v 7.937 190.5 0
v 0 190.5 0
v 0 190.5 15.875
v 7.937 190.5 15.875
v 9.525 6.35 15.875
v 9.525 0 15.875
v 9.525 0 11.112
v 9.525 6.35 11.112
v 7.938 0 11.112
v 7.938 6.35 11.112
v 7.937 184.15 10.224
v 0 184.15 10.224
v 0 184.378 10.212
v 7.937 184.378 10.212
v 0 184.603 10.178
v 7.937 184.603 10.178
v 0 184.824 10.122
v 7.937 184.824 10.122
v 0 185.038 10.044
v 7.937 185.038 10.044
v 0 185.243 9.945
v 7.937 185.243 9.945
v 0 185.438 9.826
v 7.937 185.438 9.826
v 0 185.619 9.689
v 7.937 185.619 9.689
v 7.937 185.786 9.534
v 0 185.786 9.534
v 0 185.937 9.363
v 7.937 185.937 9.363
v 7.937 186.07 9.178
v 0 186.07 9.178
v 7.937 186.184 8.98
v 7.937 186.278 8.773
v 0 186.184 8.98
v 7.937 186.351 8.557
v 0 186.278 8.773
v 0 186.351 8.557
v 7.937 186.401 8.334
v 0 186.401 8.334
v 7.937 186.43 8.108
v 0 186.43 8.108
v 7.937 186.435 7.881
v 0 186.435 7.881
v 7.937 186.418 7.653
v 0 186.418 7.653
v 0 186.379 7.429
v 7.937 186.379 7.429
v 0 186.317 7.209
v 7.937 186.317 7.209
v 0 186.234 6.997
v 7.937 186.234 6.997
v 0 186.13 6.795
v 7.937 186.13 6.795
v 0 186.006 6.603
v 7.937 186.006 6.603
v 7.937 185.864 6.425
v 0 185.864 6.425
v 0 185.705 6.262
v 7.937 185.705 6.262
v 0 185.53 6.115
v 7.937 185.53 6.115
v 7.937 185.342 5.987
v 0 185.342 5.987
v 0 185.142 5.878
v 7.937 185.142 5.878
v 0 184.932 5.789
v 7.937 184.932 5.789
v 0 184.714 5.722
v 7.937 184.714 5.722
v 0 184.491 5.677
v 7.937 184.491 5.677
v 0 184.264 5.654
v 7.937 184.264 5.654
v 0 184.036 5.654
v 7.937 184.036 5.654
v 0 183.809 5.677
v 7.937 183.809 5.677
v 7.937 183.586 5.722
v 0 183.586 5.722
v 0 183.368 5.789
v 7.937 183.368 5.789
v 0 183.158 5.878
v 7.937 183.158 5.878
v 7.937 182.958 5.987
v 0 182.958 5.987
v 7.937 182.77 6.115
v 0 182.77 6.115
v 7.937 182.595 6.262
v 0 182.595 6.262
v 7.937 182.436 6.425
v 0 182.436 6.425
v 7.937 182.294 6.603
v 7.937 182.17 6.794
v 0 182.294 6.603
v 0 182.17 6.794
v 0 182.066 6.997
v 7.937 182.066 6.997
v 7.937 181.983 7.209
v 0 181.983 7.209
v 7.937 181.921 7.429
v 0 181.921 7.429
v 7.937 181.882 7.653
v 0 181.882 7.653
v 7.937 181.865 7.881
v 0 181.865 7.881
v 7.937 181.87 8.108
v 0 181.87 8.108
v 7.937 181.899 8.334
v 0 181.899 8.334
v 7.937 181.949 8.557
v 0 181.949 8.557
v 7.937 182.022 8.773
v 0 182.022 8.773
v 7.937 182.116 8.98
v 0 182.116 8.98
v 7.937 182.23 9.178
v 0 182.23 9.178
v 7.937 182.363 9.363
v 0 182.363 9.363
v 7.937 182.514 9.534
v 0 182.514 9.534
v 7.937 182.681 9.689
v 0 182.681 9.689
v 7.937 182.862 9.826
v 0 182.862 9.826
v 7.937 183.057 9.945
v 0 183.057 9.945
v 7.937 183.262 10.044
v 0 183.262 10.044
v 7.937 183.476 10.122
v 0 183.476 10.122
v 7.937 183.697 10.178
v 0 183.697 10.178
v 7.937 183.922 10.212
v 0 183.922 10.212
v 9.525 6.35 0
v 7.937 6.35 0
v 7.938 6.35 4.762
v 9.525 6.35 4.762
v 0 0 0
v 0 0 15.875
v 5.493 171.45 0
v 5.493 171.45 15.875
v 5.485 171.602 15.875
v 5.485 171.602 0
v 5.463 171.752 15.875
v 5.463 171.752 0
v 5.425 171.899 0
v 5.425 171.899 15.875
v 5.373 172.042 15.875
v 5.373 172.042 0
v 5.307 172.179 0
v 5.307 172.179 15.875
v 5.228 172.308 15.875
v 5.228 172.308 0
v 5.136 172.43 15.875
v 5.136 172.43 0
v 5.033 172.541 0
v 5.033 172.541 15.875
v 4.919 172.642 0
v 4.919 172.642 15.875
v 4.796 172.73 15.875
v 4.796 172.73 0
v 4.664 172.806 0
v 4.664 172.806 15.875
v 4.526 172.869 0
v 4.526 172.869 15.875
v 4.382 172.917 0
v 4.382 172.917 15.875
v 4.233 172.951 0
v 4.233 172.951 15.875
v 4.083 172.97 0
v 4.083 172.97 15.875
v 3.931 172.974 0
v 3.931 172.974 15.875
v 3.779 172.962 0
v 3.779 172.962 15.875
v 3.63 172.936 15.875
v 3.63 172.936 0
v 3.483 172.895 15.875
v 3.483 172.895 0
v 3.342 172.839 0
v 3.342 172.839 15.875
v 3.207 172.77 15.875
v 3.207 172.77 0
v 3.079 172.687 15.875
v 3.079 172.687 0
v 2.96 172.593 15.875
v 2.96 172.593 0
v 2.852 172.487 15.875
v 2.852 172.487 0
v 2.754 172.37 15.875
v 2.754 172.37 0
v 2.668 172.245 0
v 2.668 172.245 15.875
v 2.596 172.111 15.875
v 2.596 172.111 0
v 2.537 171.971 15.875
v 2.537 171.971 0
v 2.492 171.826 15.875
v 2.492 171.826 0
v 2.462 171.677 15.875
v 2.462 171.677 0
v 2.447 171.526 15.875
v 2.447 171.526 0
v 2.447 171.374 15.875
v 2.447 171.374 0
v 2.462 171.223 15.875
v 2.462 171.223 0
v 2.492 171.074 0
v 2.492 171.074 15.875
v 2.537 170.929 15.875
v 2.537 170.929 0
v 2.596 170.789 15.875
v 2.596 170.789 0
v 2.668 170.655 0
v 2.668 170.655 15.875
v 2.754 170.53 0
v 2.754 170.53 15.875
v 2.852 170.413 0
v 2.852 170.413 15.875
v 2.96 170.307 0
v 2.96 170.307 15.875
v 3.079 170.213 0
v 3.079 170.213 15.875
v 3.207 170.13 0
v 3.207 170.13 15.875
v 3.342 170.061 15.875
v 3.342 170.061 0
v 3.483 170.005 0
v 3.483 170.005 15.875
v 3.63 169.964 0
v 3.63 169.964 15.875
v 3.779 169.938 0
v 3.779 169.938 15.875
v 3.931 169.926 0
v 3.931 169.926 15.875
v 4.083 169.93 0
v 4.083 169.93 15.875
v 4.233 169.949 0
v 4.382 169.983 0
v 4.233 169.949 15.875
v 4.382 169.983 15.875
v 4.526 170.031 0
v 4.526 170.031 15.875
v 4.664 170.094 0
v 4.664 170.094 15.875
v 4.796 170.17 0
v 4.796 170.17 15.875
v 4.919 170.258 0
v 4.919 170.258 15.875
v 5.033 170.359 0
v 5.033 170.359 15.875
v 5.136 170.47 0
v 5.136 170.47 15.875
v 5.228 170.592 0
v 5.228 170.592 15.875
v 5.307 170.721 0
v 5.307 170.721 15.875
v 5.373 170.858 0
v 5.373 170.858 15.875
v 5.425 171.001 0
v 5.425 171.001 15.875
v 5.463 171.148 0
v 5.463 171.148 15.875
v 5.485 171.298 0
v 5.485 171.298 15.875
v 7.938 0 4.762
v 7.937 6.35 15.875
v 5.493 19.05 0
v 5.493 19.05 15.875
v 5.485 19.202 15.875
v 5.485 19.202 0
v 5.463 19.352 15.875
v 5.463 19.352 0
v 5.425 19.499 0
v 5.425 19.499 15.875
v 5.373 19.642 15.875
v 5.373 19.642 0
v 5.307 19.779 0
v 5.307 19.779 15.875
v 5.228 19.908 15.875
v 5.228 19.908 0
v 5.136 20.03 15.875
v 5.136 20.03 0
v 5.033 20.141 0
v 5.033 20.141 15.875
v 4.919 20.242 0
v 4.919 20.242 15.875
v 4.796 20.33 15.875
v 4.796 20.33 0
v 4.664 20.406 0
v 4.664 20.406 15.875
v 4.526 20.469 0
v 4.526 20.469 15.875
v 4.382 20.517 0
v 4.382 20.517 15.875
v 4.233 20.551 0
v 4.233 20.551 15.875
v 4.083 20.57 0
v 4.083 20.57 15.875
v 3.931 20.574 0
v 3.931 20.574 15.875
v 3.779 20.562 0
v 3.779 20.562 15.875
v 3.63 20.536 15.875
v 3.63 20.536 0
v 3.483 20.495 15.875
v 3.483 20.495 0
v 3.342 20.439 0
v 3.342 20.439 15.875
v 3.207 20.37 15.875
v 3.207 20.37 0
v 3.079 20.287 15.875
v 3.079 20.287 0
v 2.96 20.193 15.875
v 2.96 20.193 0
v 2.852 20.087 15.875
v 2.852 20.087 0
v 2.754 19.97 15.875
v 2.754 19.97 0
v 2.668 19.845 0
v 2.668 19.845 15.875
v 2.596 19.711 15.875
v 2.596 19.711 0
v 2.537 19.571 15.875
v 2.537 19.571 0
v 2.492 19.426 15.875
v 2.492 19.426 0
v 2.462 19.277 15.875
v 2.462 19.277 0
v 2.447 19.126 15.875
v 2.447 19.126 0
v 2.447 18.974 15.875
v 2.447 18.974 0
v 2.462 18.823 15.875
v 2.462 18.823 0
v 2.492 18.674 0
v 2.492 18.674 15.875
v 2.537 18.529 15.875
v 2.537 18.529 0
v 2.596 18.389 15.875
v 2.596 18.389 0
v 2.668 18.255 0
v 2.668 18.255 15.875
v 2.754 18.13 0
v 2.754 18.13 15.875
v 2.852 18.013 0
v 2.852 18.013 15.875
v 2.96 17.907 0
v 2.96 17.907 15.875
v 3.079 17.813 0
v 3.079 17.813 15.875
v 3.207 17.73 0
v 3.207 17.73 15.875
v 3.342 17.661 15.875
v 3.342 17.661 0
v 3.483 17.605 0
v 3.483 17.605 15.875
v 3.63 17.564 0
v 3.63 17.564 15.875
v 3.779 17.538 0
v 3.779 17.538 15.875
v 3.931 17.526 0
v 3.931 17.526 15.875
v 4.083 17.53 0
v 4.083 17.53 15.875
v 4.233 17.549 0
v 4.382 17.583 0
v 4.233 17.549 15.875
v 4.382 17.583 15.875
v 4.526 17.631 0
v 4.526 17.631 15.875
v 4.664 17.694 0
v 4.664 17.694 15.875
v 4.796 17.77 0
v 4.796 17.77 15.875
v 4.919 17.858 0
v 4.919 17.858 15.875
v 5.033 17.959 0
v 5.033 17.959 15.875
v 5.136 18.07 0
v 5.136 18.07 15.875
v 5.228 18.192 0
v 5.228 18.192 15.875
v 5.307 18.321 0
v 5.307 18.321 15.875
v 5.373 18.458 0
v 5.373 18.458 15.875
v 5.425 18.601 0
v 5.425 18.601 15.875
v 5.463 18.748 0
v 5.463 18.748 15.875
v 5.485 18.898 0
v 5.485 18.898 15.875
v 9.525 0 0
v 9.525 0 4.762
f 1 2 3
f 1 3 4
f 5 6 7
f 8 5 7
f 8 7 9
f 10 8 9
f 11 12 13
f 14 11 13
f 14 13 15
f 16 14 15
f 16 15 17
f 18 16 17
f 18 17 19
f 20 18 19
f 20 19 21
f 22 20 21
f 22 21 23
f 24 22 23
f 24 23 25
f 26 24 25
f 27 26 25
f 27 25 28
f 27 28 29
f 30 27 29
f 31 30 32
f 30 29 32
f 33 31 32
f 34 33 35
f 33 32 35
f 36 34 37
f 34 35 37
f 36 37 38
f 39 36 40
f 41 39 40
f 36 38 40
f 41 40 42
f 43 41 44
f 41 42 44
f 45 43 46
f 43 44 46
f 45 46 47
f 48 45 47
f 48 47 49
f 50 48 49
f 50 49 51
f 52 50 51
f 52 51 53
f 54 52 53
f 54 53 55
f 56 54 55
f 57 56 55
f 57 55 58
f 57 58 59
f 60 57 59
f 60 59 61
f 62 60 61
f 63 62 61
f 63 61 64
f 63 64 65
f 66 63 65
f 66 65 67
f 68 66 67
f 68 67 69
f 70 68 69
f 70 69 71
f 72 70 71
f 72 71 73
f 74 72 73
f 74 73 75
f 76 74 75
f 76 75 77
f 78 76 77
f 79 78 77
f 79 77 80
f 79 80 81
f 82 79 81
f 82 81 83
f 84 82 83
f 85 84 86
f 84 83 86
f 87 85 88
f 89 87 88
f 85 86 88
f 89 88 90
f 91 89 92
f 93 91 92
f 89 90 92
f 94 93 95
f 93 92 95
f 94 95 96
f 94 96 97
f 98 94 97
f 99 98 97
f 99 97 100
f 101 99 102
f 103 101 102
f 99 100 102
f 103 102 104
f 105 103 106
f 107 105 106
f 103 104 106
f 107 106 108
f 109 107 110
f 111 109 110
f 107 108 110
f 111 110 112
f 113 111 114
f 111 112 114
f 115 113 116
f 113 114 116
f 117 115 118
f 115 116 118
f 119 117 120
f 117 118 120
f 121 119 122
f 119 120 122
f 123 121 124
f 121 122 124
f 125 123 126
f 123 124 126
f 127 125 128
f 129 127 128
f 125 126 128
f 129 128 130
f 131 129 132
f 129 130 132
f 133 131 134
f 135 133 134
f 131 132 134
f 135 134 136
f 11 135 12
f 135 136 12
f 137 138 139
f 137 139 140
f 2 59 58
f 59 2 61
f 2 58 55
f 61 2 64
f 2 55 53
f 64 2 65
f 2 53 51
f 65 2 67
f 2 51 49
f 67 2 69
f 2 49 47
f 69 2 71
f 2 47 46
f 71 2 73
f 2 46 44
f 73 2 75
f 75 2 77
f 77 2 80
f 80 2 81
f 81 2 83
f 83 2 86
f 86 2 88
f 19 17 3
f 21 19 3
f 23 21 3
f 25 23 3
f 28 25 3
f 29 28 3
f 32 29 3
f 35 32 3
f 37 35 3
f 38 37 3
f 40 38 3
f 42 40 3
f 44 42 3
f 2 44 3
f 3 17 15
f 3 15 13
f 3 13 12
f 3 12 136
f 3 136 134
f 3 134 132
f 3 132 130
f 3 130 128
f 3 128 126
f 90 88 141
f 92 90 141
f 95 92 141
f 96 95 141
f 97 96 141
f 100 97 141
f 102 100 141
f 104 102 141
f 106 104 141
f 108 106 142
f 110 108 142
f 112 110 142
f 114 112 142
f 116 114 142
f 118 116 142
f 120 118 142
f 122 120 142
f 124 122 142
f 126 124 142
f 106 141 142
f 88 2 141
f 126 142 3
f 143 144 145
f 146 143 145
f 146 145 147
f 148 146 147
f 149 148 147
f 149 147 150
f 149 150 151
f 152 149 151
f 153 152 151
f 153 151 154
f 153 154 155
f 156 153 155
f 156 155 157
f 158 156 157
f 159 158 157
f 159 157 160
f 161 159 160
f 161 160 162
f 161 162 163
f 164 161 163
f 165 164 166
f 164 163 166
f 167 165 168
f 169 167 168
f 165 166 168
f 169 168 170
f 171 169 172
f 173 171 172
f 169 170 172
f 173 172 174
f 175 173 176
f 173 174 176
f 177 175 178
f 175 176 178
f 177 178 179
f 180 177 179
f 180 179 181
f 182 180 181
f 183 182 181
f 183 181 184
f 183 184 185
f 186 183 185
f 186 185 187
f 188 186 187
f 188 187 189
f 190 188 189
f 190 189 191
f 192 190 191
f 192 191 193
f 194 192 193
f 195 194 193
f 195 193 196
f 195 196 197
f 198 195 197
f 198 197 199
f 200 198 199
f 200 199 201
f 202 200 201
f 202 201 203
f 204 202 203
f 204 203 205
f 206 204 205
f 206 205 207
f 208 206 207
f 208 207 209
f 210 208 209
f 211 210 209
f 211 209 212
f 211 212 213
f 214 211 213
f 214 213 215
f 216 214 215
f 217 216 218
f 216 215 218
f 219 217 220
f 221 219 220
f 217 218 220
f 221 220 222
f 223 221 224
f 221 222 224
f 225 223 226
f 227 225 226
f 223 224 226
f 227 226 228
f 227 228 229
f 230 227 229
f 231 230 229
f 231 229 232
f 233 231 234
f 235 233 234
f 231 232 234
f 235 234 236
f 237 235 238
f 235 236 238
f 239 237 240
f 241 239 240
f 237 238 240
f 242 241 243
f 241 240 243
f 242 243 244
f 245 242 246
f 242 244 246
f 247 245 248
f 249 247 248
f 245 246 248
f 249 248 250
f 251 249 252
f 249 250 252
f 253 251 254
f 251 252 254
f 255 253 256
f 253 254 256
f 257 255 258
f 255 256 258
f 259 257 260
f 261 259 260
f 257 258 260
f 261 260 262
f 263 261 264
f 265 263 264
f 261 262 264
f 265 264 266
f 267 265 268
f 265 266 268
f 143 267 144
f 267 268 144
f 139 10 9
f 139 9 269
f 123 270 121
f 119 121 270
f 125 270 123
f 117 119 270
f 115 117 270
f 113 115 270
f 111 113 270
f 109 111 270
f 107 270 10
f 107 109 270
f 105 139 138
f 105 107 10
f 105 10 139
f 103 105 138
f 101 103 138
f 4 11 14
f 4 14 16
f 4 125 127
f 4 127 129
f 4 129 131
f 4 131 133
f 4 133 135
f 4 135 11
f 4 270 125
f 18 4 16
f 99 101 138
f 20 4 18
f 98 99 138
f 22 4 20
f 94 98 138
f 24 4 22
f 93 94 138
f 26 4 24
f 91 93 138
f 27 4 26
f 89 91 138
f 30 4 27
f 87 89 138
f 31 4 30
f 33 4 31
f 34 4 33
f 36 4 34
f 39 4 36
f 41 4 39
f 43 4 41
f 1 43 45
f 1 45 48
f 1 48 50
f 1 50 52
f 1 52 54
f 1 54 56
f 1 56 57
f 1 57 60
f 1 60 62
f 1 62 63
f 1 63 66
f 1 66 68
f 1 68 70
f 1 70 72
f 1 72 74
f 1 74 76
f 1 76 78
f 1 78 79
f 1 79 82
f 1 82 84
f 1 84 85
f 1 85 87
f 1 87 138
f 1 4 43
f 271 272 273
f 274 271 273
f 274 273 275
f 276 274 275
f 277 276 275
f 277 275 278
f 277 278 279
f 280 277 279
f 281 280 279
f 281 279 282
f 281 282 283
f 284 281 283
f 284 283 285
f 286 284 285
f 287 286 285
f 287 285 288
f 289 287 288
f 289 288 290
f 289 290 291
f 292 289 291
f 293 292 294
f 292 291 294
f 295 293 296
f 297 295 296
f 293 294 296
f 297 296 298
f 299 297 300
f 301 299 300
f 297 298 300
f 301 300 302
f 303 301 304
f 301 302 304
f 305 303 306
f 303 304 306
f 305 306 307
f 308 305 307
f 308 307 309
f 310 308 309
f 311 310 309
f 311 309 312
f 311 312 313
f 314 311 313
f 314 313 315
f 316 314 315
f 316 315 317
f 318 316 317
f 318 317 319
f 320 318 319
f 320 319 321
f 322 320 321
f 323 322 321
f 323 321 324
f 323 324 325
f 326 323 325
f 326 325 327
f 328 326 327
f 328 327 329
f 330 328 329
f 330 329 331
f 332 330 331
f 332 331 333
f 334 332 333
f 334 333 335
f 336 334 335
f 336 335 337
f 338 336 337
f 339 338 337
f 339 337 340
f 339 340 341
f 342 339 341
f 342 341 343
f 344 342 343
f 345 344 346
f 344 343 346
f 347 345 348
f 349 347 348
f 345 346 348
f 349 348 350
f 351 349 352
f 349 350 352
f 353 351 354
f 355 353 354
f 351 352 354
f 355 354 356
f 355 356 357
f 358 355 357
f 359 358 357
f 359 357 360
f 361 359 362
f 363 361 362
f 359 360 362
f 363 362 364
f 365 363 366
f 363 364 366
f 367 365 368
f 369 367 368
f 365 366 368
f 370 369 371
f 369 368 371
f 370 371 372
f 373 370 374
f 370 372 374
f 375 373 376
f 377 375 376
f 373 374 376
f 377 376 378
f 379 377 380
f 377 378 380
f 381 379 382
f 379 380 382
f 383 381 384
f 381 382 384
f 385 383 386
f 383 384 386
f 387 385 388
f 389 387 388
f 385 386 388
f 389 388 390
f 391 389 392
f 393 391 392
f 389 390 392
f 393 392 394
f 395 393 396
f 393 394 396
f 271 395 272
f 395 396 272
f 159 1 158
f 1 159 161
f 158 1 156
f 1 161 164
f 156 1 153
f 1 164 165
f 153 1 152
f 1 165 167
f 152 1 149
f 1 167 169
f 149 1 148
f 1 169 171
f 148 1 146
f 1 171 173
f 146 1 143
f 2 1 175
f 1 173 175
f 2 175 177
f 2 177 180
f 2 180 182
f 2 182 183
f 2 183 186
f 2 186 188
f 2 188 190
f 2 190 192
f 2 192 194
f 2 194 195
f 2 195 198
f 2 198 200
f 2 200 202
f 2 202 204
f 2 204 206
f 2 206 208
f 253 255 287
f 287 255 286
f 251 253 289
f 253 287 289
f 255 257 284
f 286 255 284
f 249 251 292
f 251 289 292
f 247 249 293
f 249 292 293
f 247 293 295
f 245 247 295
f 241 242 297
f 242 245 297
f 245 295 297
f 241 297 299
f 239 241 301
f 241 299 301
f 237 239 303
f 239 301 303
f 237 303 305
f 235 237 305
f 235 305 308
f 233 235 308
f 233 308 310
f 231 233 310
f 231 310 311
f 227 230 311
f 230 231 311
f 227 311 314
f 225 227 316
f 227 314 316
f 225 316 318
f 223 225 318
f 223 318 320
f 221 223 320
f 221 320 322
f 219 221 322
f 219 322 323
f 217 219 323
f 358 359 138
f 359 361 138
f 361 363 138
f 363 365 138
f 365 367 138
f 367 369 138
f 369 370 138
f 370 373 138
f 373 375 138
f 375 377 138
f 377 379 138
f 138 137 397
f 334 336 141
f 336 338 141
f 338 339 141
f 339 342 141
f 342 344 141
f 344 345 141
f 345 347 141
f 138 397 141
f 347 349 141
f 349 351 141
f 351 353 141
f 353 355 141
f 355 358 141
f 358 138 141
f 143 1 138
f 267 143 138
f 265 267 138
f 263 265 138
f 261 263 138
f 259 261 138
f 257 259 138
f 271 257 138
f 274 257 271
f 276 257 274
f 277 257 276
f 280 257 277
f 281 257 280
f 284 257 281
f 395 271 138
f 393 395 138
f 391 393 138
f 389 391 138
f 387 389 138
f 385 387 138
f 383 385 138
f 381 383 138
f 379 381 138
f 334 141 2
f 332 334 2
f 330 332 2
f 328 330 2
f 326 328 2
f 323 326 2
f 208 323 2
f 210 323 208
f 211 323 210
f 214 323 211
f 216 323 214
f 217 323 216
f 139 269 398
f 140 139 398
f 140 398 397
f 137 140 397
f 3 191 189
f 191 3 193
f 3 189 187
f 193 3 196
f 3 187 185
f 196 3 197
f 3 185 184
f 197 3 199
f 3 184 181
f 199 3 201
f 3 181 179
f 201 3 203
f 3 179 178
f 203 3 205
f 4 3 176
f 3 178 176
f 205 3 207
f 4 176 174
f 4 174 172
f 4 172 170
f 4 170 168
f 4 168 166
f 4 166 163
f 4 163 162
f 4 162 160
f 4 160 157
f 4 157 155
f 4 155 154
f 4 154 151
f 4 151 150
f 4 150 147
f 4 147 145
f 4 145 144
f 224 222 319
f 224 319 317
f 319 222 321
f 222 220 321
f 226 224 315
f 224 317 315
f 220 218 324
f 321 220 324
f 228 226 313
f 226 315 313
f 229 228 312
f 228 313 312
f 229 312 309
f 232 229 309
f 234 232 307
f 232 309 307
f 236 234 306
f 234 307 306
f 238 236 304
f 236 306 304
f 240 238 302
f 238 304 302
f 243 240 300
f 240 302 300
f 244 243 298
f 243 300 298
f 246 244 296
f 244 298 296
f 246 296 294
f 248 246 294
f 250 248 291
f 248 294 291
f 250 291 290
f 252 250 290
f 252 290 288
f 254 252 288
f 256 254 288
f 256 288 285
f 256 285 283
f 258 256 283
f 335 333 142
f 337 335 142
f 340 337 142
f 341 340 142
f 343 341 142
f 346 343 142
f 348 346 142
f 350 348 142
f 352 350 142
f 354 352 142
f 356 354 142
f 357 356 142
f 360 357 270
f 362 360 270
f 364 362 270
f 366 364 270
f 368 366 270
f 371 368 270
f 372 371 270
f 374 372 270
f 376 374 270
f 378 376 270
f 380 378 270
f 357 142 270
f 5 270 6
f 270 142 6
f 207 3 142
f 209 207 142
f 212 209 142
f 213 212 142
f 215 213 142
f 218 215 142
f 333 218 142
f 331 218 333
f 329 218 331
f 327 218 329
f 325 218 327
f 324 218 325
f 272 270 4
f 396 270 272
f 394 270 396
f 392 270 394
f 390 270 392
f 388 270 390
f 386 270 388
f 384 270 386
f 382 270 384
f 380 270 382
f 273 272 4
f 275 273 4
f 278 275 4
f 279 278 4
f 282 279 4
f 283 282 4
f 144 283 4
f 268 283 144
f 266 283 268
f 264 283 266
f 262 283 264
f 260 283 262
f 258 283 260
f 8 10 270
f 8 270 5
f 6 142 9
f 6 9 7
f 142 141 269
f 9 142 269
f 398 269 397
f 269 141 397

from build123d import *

# Parameters (mm, degrees)
BOSS_EXTRUDE1_DEPTH = 190.5
SKETCH2_W           = 1.5875
SKETCH2_H           = 15.875
CUT_EXTRUDE1_DEPTH  = 184.15
SKETCH3_R           = 1.524
CUT_EXTRUDE2_DEPTH  = 192.397469288
SKETCH4_R           = 2.286
CUT_EXTRUDE3_DEPTH  = 192.397469288


with BuildPart() as part:
    # Sketch1 → Boss-Extrude1 (new body)
    with BuildSketch(Plane(origin=(0, 0, 0), x_dir=(1, 0, 0), z_dir=(0, 1, 0))):
        Polygon((0, 0), (0, -15.875), (9.525, -15.875), (9.525, -11.1125), (7.9375, -11.1125), (7.9375, -4.7625), (9.525, -4.7625), (9.525, 0), align=None)
    extrude(amount=BOSS_EXTRUDE1_DEPTH)

    # Sketch2 → Cut-Extrude1 (cut)
    with BuildSketch(Plane(origin=(0, 190.5, 0), x_dir=(1, 0, 0), z_dir=(0, 1, 0))):
        with Locations((8.73125, -7.9375)):
            Rectangle(SKETCH2_W, SKETCH2_H)
    extrude(amount=-CUT_EXTRUDE1_DEPTH, mode=Mode.SUBTRACT)

    # Sketch3 → Cut-Extrude2 (cut, through all)
    with BuildSketch(Plane.XY.offset(15.875)):
        with Locations((3.96875, 19.05)):
            Circle(SKETCH3_R)
        with Locations((3.96875, 171.45)):
            Circle(SKETCH3_R)
    extrude(amount=-CUT_EXTRUDE2_DEPTH, mode=Mode.SUBTRACT)

    # Sketch4 → Cut-Extrude3 (cut, through all)
    with BuildSketch(Plane.ZY):
        with Locations((7.9375, 184.15)):
            Circle(SKETCH4_R)
    extrude(amount=-CUT_EXTRUDE3_DEPTH, mode=Mode.SUBTRACT)


solid = part.part
